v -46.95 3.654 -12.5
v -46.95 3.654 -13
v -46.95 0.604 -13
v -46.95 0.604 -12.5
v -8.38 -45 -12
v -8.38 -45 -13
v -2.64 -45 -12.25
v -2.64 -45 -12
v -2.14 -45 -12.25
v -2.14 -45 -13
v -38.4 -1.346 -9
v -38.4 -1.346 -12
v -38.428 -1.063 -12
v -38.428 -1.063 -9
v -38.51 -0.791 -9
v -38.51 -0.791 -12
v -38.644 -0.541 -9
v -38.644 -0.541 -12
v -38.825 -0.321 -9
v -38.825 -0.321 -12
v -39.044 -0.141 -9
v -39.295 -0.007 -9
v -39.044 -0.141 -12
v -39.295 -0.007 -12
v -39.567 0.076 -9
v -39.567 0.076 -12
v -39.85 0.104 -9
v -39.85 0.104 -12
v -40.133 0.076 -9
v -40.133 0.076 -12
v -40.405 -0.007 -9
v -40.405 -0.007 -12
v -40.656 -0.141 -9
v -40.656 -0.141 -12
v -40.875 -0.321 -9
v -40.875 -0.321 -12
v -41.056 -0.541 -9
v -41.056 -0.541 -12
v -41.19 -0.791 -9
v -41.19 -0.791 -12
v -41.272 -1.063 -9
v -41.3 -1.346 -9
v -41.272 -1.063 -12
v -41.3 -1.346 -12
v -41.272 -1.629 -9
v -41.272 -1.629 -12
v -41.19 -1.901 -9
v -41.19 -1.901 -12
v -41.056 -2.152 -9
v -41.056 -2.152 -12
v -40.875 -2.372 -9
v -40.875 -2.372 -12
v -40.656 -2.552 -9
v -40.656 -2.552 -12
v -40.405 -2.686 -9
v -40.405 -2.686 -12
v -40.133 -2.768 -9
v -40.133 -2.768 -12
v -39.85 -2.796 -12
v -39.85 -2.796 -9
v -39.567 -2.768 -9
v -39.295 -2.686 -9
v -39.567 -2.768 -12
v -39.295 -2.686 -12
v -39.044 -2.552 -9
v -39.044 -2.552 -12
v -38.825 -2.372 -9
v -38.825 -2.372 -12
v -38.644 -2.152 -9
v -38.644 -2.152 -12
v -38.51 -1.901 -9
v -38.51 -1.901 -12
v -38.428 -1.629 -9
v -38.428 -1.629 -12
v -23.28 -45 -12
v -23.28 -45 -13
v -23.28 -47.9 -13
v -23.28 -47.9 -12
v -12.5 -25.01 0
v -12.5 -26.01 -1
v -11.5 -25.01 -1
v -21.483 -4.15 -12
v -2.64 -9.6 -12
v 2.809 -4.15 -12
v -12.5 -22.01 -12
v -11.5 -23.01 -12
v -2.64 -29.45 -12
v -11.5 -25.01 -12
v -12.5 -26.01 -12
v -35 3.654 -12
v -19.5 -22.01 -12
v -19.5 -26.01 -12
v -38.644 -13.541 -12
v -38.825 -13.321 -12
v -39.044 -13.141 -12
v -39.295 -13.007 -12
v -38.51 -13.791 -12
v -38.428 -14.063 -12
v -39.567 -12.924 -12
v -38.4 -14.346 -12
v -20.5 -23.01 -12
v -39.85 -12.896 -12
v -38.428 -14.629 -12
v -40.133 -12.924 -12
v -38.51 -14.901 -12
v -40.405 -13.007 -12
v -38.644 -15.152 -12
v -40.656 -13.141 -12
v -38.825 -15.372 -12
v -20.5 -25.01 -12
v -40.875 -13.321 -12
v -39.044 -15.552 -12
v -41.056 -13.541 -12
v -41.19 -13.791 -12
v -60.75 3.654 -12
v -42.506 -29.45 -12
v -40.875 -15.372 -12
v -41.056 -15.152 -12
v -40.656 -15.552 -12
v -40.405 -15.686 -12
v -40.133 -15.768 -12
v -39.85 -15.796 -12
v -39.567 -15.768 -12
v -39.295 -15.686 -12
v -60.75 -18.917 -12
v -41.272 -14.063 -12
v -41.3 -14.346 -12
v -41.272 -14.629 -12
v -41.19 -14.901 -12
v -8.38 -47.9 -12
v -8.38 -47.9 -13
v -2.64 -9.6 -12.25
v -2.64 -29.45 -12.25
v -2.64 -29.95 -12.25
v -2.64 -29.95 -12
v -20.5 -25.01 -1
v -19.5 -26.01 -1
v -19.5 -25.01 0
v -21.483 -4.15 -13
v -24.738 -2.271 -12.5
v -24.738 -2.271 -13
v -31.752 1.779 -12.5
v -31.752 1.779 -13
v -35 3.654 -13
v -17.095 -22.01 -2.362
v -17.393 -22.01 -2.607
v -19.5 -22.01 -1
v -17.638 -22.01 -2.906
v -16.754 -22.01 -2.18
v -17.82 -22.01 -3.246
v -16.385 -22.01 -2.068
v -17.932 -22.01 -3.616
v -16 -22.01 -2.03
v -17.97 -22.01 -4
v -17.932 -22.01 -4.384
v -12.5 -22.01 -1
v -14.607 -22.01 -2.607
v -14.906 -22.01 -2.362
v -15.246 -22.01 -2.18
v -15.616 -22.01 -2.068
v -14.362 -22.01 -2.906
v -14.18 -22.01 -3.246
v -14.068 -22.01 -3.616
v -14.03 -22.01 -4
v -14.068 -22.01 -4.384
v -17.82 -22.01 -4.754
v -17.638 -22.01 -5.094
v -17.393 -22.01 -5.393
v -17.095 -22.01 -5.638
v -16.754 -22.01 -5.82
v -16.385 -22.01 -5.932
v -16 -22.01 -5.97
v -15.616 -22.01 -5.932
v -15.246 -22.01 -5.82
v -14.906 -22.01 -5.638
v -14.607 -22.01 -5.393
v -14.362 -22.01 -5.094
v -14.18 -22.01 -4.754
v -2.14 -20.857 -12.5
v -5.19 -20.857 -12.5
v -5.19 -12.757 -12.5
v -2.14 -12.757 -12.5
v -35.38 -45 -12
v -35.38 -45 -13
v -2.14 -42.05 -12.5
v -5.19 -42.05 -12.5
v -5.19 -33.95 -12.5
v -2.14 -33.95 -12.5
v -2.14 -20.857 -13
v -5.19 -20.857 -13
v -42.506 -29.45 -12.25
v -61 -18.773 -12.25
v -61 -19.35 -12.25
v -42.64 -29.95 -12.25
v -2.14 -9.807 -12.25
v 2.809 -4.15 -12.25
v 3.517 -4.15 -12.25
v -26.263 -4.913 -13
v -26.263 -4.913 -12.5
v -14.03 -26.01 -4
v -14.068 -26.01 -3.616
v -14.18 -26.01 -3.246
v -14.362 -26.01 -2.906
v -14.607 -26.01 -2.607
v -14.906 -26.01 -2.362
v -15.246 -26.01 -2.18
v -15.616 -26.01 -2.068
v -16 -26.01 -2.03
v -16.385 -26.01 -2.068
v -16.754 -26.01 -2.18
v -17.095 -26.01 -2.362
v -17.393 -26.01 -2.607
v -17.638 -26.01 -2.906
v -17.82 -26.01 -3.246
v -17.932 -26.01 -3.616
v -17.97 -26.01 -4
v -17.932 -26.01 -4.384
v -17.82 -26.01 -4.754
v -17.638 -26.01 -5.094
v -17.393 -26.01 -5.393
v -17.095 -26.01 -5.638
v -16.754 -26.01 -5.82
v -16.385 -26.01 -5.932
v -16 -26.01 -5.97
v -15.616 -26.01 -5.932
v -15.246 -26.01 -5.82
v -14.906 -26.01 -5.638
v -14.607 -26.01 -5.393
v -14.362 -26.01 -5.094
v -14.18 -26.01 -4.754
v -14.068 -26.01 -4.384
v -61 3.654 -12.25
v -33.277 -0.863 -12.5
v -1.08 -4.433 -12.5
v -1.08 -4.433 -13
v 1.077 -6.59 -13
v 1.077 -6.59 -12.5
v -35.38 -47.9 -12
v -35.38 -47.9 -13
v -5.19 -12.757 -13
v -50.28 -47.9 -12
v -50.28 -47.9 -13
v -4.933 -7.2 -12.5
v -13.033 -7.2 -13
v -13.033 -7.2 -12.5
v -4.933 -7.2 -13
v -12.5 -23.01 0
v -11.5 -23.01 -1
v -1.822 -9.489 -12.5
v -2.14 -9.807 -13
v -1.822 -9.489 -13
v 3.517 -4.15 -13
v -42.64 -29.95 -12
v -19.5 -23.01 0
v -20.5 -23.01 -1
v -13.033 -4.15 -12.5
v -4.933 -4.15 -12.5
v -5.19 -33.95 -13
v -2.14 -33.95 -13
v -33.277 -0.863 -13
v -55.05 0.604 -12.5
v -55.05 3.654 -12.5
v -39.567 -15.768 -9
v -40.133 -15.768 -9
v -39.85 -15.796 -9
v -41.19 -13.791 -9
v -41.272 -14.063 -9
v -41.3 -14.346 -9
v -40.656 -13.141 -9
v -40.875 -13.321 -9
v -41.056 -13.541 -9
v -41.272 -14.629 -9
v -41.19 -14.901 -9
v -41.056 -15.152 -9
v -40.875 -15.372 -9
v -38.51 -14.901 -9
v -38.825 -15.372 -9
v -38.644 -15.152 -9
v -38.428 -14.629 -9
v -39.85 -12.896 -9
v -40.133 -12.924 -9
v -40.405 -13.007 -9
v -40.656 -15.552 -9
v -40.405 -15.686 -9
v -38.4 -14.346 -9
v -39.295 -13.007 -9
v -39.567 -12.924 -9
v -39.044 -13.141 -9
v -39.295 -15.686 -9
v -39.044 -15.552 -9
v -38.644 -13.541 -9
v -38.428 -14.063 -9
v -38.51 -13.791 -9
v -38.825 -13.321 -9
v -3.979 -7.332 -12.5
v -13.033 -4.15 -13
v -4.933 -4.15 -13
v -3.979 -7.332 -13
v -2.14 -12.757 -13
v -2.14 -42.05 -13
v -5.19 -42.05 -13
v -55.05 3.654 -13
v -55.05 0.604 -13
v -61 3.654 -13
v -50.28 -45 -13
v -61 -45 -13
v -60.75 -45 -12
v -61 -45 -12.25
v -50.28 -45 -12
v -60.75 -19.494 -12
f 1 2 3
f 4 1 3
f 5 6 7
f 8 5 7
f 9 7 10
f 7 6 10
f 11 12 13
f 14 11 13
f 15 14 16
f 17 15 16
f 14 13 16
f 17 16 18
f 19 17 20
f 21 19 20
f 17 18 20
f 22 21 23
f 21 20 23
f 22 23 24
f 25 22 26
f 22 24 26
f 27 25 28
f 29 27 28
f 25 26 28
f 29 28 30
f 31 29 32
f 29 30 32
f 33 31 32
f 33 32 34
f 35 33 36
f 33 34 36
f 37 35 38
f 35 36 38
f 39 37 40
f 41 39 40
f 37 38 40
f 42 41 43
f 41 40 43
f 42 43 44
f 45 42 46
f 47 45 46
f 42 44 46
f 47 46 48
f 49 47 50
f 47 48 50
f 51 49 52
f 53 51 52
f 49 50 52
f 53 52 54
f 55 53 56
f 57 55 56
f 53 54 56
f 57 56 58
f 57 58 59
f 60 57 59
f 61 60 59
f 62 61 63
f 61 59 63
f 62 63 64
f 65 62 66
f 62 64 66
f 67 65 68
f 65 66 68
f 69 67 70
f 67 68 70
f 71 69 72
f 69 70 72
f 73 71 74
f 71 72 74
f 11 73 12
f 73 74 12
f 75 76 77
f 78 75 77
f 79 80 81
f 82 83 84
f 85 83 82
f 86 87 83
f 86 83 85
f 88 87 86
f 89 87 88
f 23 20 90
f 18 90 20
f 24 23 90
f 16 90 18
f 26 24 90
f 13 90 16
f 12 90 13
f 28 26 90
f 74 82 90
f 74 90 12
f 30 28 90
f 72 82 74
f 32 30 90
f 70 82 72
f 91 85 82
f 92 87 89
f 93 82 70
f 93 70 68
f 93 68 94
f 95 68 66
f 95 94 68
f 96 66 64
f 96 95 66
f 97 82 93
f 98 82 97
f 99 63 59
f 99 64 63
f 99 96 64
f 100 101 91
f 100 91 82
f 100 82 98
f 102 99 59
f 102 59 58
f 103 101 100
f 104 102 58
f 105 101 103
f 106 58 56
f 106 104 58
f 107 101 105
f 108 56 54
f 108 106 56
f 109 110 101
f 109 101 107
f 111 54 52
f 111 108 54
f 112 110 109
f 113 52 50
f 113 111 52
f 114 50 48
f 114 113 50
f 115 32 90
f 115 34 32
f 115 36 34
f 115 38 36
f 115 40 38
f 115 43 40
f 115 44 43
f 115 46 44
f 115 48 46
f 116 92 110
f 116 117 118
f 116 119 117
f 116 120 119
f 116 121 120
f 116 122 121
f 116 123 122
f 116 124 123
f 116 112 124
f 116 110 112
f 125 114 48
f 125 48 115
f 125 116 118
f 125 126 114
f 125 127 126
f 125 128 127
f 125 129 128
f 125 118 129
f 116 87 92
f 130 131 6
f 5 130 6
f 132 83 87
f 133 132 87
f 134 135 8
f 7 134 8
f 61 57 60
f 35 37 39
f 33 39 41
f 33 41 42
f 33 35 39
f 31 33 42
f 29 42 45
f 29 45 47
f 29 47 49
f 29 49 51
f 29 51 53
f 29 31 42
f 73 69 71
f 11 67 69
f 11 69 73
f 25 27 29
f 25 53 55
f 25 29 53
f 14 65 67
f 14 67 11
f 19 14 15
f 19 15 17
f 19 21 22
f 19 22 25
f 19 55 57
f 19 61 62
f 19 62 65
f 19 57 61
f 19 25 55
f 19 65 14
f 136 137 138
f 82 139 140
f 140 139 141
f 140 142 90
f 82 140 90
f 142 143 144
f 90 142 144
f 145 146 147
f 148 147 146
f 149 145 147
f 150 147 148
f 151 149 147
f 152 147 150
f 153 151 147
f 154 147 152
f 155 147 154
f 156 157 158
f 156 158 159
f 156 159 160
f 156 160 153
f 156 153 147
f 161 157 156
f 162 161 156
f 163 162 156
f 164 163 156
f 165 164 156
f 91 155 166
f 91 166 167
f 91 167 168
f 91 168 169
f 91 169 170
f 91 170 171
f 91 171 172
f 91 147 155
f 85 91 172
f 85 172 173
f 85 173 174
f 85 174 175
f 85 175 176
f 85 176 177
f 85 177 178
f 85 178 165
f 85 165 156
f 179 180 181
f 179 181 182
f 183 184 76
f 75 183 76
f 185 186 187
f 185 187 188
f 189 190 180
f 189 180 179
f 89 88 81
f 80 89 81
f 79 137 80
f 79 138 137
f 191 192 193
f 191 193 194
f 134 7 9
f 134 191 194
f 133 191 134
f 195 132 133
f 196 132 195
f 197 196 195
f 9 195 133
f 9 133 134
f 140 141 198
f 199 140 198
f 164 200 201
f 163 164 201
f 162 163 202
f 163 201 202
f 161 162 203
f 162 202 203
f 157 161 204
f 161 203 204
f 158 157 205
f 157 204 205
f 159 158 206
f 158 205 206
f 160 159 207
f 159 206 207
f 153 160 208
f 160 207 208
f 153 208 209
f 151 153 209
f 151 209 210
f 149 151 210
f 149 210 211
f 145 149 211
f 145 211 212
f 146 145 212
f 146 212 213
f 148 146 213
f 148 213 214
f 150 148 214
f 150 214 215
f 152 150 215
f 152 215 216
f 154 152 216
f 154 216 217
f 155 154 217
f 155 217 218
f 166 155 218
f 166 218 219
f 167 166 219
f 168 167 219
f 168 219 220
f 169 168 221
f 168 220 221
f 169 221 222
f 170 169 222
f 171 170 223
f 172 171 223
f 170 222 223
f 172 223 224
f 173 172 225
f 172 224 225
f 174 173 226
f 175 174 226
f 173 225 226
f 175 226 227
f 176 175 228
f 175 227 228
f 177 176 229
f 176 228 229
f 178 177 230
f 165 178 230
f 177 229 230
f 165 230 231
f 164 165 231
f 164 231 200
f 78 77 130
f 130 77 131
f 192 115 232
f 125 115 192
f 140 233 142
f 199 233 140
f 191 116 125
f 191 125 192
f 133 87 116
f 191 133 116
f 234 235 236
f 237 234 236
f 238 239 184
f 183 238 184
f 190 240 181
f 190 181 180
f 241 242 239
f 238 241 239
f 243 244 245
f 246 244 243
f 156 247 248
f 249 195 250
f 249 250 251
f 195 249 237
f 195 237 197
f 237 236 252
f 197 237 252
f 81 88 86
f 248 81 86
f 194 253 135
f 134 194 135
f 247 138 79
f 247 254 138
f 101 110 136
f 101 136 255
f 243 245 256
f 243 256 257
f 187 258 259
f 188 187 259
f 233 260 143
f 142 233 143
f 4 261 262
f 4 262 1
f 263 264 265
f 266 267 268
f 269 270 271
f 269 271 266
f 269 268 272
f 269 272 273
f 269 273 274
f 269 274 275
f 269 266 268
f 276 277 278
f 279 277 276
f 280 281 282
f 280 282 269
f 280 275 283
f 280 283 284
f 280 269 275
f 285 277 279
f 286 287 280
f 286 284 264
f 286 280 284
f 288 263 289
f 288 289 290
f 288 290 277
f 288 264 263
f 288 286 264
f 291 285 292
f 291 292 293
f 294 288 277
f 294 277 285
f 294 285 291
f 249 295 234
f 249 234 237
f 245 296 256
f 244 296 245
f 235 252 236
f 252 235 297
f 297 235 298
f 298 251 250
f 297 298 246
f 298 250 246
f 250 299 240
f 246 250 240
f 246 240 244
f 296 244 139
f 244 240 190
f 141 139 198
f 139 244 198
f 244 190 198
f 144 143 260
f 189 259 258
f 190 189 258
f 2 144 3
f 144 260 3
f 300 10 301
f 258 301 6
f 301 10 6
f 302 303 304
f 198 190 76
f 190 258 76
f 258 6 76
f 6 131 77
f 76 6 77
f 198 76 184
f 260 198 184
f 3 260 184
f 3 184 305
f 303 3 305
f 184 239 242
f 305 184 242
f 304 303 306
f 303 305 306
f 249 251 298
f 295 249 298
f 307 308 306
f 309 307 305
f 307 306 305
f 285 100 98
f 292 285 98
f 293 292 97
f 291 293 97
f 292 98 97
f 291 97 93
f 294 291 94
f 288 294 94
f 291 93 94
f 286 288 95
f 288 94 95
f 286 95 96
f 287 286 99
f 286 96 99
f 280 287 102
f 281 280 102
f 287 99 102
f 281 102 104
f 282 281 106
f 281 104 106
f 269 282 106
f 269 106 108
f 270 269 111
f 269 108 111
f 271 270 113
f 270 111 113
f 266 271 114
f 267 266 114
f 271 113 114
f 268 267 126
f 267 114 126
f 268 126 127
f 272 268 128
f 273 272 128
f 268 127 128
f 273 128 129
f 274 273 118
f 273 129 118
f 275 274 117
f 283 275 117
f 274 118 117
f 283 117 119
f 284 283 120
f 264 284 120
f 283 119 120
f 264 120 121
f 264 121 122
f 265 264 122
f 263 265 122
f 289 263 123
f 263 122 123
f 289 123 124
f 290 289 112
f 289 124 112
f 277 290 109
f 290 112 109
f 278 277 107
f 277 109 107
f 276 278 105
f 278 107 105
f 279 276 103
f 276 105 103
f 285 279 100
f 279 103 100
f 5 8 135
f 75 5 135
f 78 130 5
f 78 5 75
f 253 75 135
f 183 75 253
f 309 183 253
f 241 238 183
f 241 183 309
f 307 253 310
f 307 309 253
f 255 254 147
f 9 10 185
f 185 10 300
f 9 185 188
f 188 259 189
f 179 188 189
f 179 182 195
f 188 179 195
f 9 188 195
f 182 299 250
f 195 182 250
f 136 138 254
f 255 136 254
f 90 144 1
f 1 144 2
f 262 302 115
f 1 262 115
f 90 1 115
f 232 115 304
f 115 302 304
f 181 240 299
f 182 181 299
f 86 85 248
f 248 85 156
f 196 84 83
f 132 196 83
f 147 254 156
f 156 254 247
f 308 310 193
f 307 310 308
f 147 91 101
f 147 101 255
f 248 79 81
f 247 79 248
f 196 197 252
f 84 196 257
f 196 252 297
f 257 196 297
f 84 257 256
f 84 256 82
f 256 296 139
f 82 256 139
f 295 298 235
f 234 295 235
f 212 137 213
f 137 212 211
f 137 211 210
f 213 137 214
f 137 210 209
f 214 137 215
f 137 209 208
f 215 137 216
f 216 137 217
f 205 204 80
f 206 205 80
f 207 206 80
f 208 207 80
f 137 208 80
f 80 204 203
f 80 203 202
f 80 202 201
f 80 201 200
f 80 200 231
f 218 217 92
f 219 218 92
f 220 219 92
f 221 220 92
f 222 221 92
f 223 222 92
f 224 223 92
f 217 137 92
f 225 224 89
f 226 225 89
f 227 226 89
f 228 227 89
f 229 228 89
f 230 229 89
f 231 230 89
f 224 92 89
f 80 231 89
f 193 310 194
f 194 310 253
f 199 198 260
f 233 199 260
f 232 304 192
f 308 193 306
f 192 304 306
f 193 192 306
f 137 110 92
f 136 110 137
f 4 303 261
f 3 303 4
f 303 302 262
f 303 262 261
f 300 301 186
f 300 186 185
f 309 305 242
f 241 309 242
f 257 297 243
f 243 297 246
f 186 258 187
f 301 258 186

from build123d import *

# Parameters (mm, degrees)
PAD037_DEPTH    = 1
SKETCH062_W     = 8.1
SKETCH062_H     = 3.05
SKETCH062_W_2   = 3.05
SKETCH062_H_2   = 8.1
POCKET025_DEPTH = 0.5
POCKET026_DEPTH = 0.25
POCKET027_DEPTH = 0.25
CHAMFER010_SIZE = 0.25
SKETCH065_W     = 9
SKETCH065_H     = 4
PAD038_DEPTH    = 12
SKETCH066_R     = 1.97
POCKET028_DEPTH = 29.6647358036
SKETCH067_R     = 1.45
PAD039_DEPTH    = 3
CHAMFER011_SIZE = 1


with BuildPart() as part:
    # Sketch061 (on Face2 of Binder016) → Pad037 (new body)
    with BuildSketch(Plane(origin=(0, 0, -13), x_dir=(1, 0, 0), z_dir=(0, 0, -1))):
        Polygon((-61, -3.6537388036), (-61, 44.999997), (-50.28, 44.999997), (-50.28, 47.899997), (-35.38, 47.899997), (-35.38, 44.999997), (-23.28025859, 44.999997), (-23.28025859, 47.899997), (-8.38025859, 47.899997), (-8.38025859, 44.999997), (-2.14025859, 44.999997), (-2.14025859, 9.80692559), (3.5165956595, 4.1500713405), (-21.4834043405, 4.1500713405), (-35, -3.6537388036), align=None)
    extrude(amount=-PAD037_DEPTH)

    # Sketch062 (on Face16 of Pad037) → Pocket025 (cut)
    with BuildSketch(Plane(origin=(0, 0, -13), x_dir=(1, 0, 0), z_dir=(0, 0, -1))):
        with Locations((-51, -2.1287388036)):
            Rectangle(SKETCH062_W, SKETCH062_H)
        with Locations((-8.9834043405, 5.6750713405)):
            Rectangle(SKETCH062_W, SKETCH062_H)
        with Locations((-3.66525859, 16.80692559)):
            Rectangle(SKETCH062_W_2, SKETCH062_H_2)
        with Locations((-3.66525859, 37.999997)):
            Rectangle(SKETCH062_W_2, SKETCH062_H_2)
        Polygon((1.0770772644, 6.5895897356), (-1.8220605384, 9.4887275384), (-3.9787362211, 7.3320518558), (-1.0795984182, 4.432914053), align=None)
        Polygon((-31.752404736, -1.7787388033), (-24.7375989657, 2.2712611973), (-26.2625989659, 4.9126386787), (-33.2774047362, 0.8626386781), align=None)
    extrude(amount=-POCKET025_DEPTH, mode=Mode.SUBTRACT)

    # Sketch063 (on Face5 of Pocket025) → Pocket026 (cut)
    with BuildSketch(Plane.XY.offset(-12)):
        Polygon((-2.14025859, -44.999997), (-2.14025859, -9.80692559), (3.5165956595, -4.1500713405), (2.8094888783, -4.1500713405), (-2.64025859, -9.5998188088), (-2.64025859, -44.999997), align=None)
    extrude(amount=-POCKET026_DEPTH, mode=Mode.SUBTRACT)

    # Sketch064 (on Face5 of Pocket026) → Pocket027 (cut)
    with BuildSketch(Plane.XY.offset(-12)):
        Polygon((-2.64025859, -29.449997), (-42.5062839938, -29.449997), (-61, -18.7726450855), (-61, -19.3499953547), (-42.64025859, -29.949997), (-2.64025859, -29.949997), align=None)
    extrude(amount=-POCKET027_DEPTH, mode=Mode.SUBTRACT)

    # Chamfer010
    chamfer010_edges = [part.edges().sort_by_distance(p)[0] for p in [
        (-61, -32.174996, -12),
        (-61, -7.559453, -12),
    ]]
    chamfer(chamfer010_edges, length=CHAMFER010_SIZE)

    # Sketch065 (on Face46 of Chamfer010) → Pad038 (join)
    with BuildSketch(Plane.XY.offset(-12)):
        with Locations((-16.00025859, -24.009997)):
            Rectangle(SKETCH065_W, SKETCH065_H)
    extrude(amount=PAD038_DEPTH)

    # Sketch066 (on Face54 of Pad038) → Pocket028 (cut, through all)
    with BuildSketch(Plane.XZ.offset(26.009997)):
        with Locations((-16.00025859, -4)):
            Circle(SKETCH066_R)
    extrude(amount=-POCKET028_DEPTH, mode=Mode.SUBTRACT)

    # Sketch067 (on Face46 of Pocket028) → Pad039 (join)
    with BuildSketch(Plane.XY.offset(-12)):
        with Locations((-39.85, -1.3462611964)):
            Circle(SKETCH067_R)
        with Locations((-39.85, -14.3462611964)):
            Circle(SKETCH067_R)
    extrude(amount=PAD039_DEPTH)

    # Chamfer011
    chamfer011_edges = [part.edges().sort_by_distance(p)[0] for p in [
        (-11.500259, -26.009997, -6),
        (-16.000259, -26.009997, 0),
        (-20.500259, -26.009997, -6),
        (-20.500259, -24.009997, 0),
        (-16.000259, -22.009997, 0),
        (-11.500259, -24.009997, 0),
        (-11.500259, -22.009997, -6),
        (-20.500259, -22.009997, -6),
    ]]
    chamfer(chamfer011_edges, length=CHAMFER011_SIZE)


solid = part.part
